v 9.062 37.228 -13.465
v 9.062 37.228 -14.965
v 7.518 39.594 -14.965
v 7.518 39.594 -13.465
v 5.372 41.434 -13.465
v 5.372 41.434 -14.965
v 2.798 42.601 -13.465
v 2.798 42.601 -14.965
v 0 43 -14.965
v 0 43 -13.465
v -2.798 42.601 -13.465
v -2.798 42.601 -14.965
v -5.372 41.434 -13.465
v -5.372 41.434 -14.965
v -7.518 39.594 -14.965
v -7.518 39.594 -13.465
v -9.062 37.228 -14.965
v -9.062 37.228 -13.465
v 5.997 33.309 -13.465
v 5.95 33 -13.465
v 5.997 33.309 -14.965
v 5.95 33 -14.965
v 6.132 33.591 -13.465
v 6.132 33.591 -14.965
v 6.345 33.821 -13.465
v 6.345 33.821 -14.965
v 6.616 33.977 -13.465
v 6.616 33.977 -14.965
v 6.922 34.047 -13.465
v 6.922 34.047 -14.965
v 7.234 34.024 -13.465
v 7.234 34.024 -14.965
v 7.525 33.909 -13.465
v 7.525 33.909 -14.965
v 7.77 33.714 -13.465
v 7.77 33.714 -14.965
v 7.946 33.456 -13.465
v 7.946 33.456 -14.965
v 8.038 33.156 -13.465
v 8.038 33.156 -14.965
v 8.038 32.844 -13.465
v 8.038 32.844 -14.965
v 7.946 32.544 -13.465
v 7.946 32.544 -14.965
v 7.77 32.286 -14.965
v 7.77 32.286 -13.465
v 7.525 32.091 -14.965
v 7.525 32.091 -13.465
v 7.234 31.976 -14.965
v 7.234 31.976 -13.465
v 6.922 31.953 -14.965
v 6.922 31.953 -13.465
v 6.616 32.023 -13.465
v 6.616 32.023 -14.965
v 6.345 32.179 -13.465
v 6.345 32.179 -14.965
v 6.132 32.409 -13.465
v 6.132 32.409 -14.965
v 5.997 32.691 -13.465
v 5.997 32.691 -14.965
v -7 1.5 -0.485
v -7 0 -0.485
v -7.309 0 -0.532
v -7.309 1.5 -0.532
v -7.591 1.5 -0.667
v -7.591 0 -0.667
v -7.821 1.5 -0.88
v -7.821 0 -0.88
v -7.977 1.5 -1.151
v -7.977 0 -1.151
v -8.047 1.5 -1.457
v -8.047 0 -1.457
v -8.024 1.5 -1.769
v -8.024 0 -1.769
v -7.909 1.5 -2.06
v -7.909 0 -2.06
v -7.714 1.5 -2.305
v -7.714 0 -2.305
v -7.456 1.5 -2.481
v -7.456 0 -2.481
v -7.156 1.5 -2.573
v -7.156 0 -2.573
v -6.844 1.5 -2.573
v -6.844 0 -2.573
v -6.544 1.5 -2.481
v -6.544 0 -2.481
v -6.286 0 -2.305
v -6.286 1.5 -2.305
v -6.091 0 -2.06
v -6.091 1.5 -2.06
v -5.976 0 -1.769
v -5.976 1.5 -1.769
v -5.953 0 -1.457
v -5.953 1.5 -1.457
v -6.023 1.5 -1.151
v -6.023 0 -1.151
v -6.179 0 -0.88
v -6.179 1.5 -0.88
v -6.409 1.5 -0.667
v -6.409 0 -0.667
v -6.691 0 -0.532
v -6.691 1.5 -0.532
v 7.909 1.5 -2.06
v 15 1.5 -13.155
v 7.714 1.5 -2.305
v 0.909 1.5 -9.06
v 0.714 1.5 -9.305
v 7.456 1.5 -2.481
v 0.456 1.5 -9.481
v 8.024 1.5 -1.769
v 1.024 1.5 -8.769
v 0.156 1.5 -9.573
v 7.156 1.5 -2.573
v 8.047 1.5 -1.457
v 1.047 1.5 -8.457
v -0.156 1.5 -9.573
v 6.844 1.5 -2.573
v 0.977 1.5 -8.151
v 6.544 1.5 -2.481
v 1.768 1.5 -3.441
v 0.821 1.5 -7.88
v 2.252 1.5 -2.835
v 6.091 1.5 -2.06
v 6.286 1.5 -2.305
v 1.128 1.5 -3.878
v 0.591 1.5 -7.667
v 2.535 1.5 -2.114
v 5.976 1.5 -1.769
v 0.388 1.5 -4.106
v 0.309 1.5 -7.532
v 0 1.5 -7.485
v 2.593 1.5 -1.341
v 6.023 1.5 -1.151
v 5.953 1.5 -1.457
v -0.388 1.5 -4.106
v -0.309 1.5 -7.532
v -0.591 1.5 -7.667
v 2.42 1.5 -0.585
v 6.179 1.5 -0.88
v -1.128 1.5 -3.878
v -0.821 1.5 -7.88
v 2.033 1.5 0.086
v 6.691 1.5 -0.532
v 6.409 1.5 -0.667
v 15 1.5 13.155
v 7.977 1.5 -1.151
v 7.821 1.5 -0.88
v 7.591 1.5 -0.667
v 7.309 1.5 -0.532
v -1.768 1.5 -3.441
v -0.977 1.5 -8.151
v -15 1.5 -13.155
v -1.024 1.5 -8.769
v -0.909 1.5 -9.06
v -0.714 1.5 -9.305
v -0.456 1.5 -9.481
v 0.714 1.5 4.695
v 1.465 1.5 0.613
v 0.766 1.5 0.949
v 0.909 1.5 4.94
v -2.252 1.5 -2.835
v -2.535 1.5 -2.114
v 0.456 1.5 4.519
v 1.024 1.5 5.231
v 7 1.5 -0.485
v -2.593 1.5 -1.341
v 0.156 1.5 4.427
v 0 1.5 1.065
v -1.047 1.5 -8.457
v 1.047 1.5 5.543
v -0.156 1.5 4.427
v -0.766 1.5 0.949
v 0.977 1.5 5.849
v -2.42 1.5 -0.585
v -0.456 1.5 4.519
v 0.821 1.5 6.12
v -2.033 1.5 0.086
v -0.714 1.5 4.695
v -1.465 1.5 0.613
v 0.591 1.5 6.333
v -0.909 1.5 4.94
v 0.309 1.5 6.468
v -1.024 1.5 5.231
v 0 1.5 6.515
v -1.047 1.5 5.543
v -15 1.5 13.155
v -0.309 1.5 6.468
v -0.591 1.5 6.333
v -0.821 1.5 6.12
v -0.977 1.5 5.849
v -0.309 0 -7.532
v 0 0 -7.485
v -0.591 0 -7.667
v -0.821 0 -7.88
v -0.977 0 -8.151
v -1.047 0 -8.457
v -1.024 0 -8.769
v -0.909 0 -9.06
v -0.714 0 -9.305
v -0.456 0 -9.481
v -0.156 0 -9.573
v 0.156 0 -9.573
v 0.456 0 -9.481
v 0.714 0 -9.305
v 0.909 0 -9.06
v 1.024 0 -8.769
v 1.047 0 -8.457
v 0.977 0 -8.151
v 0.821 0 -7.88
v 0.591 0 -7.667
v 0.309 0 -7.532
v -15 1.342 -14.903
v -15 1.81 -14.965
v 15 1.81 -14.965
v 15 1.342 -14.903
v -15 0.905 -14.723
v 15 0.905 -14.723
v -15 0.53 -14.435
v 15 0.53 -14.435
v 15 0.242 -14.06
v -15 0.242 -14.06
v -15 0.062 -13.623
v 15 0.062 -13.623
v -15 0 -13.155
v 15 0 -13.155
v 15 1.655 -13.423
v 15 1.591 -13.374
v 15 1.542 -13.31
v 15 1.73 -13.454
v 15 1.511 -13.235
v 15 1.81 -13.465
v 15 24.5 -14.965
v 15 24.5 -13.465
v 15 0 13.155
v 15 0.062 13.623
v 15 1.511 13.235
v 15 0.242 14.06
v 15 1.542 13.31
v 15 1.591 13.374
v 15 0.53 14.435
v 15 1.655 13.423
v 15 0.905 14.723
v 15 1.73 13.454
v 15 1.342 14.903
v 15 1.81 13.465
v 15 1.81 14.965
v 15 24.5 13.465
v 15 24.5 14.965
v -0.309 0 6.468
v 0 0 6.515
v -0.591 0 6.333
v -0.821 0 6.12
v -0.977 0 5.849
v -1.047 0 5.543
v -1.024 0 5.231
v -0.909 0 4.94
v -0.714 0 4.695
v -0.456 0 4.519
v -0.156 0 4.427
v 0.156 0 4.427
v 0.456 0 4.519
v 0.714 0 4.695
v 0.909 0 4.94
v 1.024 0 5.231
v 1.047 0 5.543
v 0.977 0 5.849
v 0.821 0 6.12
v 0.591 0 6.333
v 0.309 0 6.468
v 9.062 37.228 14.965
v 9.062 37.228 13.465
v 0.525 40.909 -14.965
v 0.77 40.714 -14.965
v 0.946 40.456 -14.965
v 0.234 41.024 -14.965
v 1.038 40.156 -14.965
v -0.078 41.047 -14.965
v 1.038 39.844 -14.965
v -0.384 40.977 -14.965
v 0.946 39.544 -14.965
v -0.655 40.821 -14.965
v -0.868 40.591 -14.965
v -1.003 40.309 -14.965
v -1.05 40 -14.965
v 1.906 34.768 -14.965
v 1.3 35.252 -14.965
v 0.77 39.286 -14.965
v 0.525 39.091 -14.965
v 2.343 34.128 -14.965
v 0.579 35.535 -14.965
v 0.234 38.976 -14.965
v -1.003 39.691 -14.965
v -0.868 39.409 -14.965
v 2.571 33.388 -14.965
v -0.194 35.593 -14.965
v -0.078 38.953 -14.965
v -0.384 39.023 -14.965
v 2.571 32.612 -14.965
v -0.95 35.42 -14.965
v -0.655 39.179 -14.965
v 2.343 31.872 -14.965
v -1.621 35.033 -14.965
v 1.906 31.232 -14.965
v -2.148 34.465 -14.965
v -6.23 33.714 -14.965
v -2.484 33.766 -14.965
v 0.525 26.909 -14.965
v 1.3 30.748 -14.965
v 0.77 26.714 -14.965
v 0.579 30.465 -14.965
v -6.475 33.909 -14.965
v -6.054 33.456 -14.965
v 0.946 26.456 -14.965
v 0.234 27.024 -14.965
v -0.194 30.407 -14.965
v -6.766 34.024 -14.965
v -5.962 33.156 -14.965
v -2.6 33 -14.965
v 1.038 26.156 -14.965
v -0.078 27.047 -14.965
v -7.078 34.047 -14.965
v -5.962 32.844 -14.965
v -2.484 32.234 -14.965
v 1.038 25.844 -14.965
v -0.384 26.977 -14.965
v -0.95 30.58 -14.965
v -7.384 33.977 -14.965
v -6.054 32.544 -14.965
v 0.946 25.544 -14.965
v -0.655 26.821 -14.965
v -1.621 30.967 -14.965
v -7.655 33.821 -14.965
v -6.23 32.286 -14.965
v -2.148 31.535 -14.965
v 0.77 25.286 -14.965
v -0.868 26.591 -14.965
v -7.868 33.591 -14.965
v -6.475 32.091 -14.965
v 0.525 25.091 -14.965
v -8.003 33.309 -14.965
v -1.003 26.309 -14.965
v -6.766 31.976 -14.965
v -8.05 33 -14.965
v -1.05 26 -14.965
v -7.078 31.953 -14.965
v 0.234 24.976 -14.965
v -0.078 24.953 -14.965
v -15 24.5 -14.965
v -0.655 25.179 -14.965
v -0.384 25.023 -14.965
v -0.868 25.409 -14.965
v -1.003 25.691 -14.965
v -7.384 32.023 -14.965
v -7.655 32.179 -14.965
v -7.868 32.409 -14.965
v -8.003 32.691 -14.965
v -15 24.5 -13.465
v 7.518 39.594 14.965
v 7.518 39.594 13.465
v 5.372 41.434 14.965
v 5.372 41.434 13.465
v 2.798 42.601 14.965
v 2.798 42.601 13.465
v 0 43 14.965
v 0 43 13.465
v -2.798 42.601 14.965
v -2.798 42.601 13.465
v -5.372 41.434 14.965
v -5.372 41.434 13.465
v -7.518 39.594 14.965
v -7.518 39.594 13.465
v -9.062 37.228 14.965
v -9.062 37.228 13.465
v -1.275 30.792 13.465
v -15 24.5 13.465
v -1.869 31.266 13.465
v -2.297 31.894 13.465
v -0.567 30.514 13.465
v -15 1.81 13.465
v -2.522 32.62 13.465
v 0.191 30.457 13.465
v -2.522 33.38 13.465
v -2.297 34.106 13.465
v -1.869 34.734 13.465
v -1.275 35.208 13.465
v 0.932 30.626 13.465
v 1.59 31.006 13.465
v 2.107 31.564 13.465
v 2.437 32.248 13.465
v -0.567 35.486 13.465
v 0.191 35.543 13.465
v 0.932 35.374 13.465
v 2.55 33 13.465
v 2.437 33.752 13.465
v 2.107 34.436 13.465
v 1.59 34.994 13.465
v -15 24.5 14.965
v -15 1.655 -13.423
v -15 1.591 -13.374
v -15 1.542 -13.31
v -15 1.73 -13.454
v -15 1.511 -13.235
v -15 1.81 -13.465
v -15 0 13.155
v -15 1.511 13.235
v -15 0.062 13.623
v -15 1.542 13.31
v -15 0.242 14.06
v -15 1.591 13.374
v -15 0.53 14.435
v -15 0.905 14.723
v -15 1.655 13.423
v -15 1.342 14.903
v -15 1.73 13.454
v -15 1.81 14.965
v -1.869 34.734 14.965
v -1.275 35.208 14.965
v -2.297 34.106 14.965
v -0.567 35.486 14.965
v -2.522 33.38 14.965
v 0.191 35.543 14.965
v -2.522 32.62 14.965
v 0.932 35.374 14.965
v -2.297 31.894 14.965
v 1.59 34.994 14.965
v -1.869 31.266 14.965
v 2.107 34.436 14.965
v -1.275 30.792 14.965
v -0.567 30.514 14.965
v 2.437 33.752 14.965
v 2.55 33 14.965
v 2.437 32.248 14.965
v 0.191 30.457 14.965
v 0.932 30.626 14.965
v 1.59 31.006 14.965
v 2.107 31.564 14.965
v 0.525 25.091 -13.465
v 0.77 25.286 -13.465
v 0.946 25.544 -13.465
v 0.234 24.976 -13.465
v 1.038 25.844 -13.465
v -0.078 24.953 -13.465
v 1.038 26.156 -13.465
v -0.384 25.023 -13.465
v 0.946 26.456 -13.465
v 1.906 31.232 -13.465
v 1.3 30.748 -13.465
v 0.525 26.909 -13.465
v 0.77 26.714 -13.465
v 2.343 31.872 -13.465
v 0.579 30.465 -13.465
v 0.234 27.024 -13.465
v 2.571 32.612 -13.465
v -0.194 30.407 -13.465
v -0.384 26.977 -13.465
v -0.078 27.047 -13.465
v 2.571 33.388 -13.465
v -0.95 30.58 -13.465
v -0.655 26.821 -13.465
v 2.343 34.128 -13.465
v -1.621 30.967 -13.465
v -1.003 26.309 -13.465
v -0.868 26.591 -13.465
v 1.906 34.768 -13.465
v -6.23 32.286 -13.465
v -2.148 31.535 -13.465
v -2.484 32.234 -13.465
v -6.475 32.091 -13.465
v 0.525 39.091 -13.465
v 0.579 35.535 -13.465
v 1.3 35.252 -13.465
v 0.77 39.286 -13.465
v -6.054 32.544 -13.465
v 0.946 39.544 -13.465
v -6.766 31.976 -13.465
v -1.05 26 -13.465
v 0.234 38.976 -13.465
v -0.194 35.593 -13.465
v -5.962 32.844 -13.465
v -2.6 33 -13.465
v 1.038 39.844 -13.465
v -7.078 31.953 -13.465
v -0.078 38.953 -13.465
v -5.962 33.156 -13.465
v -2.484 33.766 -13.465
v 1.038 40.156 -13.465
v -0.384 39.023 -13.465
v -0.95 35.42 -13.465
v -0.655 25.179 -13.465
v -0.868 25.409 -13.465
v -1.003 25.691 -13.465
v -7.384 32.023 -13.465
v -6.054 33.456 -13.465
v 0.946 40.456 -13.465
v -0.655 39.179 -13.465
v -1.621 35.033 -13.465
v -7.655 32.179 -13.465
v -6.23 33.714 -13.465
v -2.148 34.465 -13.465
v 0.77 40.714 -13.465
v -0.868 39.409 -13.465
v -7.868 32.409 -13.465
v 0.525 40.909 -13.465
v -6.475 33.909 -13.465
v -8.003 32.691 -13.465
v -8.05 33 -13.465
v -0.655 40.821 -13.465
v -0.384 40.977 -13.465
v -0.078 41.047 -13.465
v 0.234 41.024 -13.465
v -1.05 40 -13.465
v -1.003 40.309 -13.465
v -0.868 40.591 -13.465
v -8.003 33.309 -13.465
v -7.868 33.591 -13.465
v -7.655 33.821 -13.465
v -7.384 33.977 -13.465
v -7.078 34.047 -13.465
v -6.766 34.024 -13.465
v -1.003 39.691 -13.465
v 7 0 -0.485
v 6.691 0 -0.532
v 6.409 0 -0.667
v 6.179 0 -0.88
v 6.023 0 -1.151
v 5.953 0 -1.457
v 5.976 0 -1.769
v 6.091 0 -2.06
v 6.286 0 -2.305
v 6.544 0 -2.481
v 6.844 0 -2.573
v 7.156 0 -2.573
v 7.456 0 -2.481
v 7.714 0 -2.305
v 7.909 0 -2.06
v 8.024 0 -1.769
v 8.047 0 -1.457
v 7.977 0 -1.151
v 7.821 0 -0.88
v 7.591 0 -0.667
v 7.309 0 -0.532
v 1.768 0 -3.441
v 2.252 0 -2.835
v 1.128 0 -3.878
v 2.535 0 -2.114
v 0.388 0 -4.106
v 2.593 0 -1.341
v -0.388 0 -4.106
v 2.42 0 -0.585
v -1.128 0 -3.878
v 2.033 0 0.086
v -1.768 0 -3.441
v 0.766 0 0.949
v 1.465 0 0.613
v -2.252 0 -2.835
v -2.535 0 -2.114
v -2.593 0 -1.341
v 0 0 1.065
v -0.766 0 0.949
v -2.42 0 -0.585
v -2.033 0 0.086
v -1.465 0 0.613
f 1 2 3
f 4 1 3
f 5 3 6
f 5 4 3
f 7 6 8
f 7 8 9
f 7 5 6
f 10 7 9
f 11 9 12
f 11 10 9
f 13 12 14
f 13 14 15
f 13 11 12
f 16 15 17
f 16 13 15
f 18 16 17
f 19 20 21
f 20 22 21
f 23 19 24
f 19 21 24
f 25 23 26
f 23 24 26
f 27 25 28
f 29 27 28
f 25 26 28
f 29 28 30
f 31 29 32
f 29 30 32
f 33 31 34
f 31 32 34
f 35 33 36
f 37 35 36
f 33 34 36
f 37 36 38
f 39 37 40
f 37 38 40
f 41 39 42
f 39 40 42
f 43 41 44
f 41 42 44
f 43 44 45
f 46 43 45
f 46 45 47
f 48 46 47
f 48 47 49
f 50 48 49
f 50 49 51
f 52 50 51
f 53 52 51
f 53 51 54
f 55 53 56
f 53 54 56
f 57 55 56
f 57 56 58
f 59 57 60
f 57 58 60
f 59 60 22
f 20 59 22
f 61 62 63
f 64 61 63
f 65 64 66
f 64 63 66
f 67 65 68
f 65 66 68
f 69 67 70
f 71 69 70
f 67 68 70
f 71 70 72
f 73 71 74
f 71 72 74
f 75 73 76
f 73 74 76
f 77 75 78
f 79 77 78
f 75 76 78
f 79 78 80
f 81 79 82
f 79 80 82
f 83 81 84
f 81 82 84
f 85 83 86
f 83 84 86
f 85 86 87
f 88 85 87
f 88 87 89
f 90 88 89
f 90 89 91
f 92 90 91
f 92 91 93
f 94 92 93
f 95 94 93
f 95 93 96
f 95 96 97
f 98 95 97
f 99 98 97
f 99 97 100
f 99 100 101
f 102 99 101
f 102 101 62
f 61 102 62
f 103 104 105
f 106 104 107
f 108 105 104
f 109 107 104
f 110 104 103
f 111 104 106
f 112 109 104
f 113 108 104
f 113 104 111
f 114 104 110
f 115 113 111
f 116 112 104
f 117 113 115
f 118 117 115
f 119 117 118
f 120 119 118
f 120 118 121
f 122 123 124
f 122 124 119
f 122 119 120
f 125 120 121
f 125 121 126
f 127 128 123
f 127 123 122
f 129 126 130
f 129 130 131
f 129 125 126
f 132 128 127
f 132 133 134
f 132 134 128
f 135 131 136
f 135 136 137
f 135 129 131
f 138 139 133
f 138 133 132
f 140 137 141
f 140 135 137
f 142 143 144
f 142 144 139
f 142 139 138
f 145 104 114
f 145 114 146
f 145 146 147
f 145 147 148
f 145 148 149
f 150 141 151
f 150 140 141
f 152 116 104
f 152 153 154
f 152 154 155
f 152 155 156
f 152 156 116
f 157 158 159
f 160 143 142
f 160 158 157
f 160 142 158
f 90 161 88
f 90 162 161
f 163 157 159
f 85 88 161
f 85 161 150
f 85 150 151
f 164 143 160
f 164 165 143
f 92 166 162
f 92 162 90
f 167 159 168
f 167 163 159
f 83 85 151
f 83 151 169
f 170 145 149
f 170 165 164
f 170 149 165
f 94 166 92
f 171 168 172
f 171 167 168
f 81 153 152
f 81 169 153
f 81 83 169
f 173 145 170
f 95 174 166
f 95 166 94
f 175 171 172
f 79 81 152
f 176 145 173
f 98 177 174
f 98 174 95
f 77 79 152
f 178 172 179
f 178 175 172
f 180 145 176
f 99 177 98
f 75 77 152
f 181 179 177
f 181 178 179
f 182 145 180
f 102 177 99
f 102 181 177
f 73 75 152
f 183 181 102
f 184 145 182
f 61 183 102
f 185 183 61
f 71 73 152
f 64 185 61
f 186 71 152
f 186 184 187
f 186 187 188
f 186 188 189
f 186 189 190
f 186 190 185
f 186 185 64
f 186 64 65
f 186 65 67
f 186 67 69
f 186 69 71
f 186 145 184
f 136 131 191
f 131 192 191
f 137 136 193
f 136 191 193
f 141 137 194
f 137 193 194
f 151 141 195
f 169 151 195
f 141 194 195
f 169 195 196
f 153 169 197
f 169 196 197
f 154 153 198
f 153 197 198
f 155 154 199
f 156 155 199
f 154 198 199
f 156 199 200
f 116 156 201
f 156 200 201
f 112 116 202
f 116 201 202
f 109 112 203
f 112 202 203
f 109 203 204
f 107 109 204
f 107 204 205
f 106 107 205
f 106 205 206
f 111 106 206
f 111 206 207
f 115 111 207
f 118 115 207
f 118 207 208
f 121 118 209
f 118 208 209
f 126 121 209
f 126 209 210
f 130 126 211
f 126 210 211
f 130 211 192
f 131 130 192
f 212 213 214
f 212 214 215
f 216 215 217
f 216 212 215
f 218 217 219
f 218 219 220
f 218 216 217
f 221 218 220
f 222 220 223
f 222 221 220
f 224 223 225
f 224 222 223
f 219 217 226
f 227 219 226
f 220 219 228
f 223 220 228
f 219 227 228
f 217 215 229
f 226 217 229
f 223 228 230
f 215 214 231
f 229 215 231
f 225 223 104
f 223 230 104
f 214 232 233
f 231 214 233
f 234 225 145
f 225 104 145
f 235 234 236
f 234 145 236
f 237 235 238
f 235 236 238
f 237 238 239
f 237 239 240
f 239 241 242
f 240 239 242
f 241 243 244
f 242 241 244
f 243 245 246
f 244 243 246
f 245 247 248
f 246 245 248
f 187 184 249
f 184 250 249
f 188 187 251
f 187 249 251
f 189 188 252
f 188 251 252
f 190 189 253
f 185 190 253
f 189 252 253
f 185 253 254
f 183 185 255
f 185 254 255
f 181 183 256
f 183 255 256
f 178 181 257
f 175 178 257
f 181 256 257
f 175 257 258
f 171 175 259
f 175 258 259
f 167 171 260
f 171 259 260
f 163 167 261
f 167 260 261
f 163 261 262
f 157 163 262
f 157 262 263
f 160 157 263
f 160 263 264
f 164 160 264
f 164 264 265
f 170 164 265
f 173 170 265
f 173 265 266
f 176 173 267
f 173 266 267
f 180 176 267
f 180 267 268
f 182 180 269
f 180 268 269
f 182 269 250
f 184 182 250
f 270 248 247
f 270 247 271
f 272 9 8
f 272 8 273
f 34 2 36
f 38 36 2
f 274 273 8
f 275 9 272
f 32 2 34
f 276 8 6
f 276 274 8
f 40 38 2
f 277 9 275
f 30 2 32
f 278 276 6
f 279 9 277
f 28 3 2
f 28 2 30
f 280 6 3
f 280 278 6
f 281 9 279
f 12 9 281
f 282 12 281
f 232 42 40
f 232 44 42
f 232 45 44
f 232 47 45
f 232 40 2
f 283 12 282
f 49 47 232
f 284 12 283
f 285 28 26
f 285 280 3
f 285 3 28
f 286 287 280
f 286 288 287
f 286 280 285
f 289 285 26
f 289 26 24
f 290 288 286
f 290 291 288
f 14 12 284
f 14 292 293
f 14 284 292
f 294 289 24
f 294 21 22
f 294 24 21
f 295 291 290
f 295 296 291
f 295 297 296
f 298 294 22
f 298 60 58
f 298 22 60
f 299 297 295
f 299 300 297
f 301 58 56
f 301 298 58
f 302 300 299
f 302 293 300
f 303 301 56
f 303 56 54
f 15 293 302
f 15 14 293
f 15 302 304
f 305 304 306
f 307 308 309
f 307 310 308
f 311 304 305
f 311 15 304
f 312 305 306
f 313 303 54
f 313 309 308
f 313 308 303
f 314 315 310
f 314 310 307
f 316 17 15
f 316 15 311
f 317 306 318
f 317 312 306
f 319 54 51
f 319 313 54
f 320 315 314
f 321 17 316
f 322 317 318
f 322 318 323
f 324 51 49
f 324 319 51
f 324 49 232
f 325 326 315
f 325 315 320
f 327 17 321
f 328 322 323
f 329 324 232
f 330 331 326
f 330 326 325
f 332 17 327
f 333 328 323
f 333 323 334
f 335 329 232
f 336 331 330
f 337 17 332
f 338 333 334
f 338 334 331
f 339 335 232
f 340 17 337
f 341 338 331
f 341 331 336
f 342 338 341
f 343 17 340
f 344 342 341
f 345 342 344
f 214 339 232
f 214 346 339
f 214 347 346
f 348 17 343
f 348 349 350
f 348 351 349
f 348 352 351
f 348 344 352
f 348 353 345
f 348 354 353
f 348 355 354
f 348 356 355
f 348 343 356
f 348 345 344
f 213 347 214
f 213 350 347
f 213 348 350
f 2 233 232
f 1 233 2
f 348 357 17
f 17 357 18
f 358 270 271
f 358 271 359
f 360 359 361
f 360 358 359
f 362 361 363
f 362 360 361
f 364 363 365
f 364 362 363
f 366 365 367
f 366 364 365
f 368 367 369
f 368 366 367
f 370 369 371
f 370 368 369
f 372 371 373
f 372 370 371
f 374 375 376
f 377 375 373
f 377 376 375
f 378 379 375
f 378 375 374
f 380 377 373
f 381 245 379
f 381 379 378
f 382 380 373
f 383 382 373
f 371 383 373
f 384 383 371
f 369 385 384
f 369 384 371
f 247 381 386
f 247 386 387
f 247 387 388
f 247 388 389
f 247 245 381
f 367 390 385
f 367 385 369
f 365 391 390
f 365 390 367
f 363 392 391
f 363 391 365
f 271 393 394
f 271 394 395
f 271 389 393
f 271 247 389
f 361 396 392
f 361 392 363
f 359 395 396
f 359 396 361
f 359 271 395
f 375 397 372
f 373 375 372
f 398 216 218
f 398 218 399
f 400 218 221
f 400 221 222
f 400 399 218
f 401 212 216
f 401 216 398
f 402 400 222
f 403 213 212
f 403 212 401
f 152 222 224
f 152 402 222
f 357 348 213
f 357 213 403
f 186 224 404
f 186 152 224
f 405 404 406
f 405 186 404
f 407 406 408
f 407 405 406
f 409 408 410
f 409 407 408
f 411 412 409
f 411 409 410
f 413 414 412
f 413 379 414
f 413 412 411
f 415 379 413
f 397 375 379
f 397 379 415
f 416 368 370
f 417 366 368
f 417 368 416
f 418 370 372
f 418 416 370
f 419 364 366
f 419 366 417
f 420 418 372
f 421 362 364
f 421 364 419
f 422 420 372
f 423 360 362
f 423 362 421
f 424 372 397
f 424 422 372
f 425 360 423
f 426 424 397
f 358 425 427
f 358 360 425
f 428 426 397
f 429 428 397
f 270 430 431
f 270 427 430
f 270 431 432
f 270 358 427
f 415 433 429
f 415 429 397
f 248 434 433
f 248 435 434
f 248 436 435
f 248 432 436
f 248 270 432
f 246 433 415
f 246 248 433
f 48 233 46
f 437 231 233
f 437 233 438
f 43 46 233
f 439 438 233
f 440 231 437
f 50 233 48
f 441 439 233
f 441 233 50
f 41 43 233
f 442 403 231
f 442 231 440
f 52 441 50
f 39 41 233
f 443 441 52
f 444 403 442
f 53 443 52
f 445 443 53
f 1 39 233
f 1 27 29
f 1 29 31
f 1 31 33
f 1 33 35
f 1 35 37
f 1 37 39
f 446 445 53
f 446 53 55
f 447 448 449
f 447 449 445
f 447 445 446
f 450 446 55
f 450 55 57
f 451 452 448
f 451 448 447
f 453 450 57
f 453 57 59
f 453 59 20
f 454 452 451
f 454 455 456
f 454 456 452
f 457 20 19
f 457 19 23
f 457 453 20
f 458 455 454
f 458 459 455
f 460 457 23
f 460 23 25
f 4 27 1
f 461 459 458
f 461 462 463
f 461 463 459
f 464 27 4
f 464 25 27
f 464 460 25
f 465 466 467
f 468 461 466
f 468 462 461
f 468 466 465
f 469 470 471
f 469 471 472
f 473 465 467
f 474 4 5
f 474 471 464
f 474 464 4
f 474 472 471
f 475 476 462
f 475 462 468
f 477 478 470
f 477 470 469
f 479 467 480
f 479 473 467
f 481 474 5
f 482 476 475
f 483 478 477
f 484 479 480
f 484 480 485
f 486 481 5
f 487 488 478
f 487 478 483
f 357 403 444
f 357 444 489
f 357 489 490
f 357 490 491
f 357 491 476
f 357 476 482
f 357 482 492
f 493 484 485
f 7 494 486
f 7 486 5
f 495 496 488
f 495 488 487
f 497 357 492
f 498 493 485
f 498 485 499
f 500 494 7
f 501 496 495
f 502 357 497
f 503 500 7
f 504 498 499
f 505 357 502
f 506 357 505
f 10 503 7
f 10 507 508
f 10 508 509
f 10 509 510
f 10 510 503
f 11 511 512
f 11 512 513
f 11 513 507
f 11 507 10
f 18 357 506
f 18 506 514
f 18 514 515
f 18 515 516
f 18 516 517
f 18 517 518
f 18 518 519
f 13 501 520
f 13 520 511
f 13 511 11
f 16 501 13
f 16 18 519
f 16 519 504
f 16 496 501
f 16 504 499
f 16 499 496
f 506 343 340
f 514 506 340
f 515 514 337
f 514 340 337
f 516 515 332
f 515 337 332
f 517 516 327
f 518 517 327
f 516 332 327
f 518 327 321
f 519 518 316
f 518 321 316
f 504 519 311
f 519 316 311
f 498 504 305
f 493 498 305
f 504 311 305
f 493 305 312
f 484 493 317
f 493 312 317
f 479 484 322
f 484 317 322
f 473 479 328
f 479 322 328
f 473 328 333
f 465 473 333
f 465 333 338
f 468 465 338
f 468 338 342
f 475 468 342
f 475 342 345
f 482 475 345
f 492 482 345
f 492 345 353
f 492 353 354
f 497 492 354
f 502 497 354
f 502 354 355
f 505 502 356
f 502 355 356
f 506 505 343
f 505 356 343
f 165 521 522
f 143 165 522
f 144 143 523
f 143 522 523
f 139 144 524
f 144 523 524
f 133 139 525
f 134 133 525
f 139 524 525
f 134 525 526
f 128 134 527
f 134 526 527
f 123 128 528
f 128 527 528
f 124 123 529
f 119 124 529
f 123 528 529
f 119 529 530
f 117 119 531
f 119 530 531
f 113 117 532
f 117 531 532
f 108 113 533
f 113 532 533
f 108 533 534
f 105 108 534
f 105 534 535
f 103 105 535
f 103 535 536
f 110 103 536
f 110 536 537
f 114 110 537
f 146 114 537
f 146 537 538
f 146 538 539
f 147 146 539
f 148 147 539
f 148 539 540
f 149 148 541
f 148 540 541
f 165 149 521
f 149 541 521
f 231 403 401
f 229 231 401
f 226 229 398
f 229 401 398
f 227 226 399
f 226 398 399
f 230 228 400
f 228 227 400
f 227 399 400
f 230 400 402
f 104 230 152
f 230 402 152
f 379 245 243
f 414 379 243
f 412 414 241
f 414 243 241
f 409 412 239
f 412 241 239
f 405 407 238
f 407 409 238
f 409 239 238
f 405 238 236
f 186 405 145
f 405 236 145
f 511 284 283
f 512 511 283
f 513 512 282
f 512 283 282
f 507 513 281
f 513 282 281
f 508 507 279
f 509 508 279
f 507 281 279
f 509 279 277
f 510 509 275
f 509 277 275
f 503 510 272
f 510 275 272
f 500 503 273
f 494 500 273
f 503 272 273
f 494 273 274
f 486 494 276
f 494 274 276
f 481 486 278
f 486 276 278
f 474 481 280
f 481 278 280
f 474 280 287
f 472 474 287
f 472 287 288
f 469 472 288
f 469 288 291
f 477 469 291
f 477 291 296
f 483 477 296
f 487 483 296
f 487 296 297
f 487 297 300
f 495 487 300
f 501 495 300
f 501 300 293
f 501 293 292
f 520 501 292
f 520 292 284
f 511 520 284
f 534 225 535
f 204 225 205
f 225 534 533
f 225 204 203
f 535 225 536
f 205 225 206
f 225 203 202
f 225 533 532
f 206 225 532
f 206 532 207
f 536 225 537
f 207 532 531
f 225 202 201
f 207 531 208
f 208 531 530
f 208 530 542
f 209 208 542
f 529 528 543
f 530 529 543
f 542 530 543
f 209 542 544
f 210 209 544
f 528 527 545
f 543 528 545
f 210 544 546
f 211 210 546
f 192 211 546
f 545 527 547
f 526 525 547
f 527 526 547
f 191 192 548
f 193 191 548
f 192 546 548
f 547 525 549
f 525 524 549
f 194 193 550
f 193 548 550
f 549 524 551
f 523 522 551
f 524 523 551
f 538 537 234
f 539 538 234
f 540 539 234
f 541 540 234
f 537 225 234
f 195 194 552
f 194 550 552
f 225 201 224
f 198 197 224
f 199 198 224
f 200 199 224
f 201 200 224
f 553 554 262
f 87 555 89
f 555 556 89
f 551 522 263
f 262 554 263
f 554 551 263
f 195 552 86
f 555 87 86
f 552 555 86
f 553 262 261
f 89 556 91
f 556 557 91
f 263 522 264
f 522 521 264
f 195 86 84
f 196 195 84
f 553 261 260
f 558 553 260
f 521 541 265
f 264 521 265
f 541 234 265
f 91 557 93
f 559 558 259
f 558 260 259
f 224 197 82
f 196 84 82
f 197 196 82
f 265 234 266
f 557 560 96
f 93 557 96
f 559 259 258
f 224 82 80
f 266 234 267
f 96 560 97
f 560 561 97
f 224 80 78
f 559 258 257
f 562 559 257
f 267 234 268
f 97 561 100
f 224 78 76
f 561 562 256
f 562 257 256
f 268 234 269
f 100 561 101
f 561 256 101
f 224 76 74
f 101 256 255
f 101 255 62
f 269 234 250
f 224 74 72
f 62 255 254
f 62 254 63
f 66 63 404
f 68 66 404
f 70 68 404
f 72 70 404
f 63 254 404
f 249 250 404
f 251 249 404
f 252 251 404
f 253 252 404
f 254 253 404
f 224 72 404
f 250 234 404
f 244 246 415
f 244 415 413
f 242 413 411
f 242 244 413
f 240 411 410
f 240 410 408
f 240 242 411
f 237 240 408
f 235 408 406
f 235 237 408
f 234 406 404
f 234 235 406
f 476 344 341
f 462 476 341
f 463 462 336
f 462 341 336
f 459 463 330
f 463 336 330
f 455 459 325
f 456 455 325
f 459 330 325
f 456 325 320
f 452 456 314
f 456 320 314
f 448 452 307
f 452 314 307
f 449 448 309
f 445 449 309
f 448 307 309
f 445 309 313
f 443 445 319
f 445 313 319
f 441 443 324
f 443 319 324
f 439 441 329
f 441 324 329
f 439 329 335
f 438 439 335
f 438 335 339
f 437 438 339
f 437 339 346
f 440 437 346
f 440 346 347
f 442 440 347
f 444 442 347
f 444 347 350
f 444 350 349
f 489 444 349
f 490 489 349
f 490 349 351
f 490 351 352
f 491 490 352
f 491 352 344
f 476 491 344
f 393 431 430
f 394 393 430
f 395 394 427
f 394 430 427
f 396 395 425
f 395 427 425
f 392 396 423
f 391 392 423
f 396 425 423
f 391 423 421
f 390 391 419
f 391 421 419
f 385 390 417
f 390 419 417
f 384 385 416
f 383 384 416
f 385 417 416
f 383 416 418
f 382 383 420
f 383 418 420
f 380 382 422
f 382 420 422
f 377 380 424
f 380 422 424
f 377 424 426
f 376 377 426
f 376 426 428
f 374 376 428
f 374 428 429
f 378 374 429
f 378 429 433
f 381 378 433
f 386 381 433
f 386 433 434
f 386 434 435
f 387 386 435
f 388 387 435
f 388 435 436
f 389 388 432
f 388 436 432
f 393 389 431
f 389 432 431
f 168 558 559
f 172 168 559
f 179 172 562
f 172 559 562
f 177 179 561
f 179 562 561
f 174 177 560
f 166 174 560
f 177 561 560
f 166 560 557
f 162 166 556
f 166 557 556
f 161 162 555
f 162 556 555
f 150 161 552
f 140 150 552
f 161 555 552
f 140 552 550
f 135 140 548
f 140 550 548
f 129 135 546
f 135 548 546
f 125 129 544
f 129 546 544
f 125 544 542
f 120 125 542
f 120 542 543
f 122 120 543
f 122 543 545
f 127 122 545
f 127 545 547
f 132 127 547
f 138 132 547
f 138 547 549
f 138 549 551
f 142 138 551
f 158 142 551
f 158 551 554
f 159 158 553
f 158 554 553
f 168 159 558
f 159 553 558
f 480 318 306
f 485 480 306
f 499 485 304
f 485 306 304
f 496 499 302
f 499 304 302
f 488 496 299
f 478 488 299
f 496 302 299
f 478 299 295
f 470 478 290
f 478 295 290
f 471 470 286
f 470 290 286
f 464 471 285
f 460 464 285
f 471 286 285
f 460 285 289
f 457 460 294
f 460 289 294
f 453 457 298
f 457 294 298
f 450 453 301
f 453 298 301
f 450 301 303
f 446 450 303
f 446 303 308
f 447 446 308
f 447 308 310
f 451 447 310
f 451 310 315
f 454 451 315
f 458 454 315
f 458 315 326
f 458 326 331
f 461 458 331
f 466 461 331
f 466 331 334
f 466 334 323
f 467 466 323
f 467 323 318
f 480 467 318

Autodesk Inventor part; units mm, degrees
ref_plane "YZ Plane" through (0, 0, 0) normal (1, 0, 0) x (0, 1, 0)
ref_plane "XZ Plane" through (0, 0, 0) normal (0, 1, 0) x (-1, 0, 0)
ref_plane "XY Plane" through (0, 0, 0) normal (0, 0, 1) x (1, 0, 0)
sketch "Sketch1" plane through (0, 0, 0) normal (0, 1, 0) x (-1, 0, 0)
  line L0 (15, 14.965) -> (-15, 14.965)
  line L1 (-15, 14.965) -> (-15, -14.965)
  line L2 (-15, -14.965) -> (15, -14.965)
  line L3 (15, -14.965) -> (15, 14.965)
  point P0 (0, 0)
  dimension "d0" = 29.93
  dimension "d1" = 30
  dimension "d2" = 15
  dimension "d3" = 14.965
extrude "Plate1" add sketch "Sketch1" along normal blind 1.5
sketch "Sketch2" plane through (-15, 0, -13.465) normal (0, 0, -1) x (-1, 0, 0)
  line L0 (-30, 0) -> (0, 0)
  line L1 (0, 0) -> (0, 43)
  line L2 (0, 43) -> (-30, 43)
  line L3 (-30, 43) -> (-30, 0)
edge flange "Flange1" height 43 angle 90 thickness 1.5 bend radius 0.31 thickness toward (0, 0, -1) relief tear relief width 1.5 relief depth 0.75 corner gap 0.31 corner form 0 edges at (0, 1.5, -14.965) (0, 1.5, 14.965) wall of the first edge with corners at (15, 0, -13.465) (-15, 0, -13.465) (-15, 43, -13.465) (15, 43, -13.465)
bend "Bend1"
corner "Corner1"
sketch "Sketch3" plane through (-15, 43, 14.965) normal (0, 0, 1) x (1, 0, 0)
  line L0 (0, 0) -> (30, 0) projected
  line L1 (0, -41.19) -> (0, 0) projected
  circle A0 centre (15, -10) radius 10
  line L2 (0, -18.5) -> (30, -18.5)
  line L3 (30, -18.5) -> (30, -28.5)
  line L4 (30, -28.5) -> (0, -28.5)
  line L5 (0, -28.5) -> (0, -18.5)
  line L6 (30, -18.5) -> (24.0624, -5.7723)
  line L7 (0, -18.5) -> (5.9376, -5.7723)
  line L8 (0, 0) -> (30, 0)
  line L9 (30, 0) -> (30, -25)
  line L10 (30, -25) -> (0, -25)
  line L11 (0, -25) -> (0, 0)
  point P0 (15, -43)
  point P1 (15, 0)
  dimension "d15" = 10
  dimension "d16" = 0
  dimension "d17" = 20
  dimension "d18" = 8.5
  dimension "d19" = 0
  dimension "d20" = 30
  dimension "d21" = 10
  dimension "d22" = 25
extrude "Extrusion1" cut sketch "Sketch3" against normal blind 35 contours L0 A0 L7 L1 | L0 L9 L6 A0
sketch "Sketch4" plane through (15, 1.81, -14.965) normal (0, 0, -1) x (-1, 0, 0)
  arc A0 (24.0624, 35.4177) -> (5.9376, 35.4177) centre (15, 31.19) ccw projected
  circle A1 centre (15, 31.19) radius 2.6
  circle A2 centre (8, 31.19) radius 1.05
  circle A3 centre (22, 31.19) radius 1.05
  circle A4 centre (15, 38.19) radius 1.05
  circle A5 centre (15, 24.19) radius 1.05
  point P0 (15, -1.81)
  dimension "d25" = 5.2
  dimension "d26" = 0
  dimension "d27" = 7
  dimension "d28" = 2.1
  dimension "d29" = 7
  dimension "d30" = 0
  dimension "d31" = 2.1
  dimension "d32" = 0
  dimension "d33" = 7
  dimension "d34" = 2.1
  dimension "d35" = 7
  dimension "d36" = 0
  dimension "d37" = 2.1
extrude "Extrusion2" cut sketch "Sketch4" against normal blind 1.5
sketch "Sketch5" plane through (-15, 1.81, 14.965) normal (0, 0, 1) x (1, 0, 0)
  arc A0 (24.0624, 35.4177) -> (5.9376, 35.4177) centre (15, 31.19) ccw projected
  circle A1 centre (15, 31.19) radius 2.55
  point P0 (15, -1.81)
  dimension "d40" = 5.1
extrude "Extrusion3" cut sketch "Sketch5" against normal blind 1.5
sketch "Sketch6" plane through (0, 1.5, 0) normal (0, 1, 0) x (1, 0, 0)
  circle A0 centre (-7, 1.535) radius 0.7835 projected
  circle A1 centre (0, 8.535) radius 0.7835 projected
  circle A2 centre (7, 1.535) radius 0.7835 projected
  circle A3 centre (0, -5.465) radius 0.7835 projected
  circle A4 centre (0, 1.535) radius 1.75 projected
  circle A5 centre (0, 1.535) radius 9.96 projected
  point P0 (0, 0)
hole "Hole1" at (-7, 1.5, -1.535) at (0, 1.5, 5.465) at (7, 1.5, -1.535) at (0, 1.5, -8.535) direction (0, -1, 0) diameter 2.1 depth 1.5
sketch "Sketch7" plane through (0, 1.5, 0) normal (0, 1, 0) x (1, 0, 0)
  circle A0 centre (0, 1.535) radius 1.75 projected
  point P0 (0, 0)
hole "Hole2" at (0, 1.5, -1.535) direction (0, -1, 0) diameter 5.2 depth 1.5 clearance for "Hex Head Bolt" size "M5" standard "Ansi Metric M Profile"
equation "\"d48\" = Thickness"
equation "\"d55\" = Thickness"
equation "\"d4\" = Thickness"
equation "\"d5\" = BendReliefWidth"
equation "\"d6\" = BendReliefDepth"
equation "\"d7\" = MinimumRemnant"
equation "\"d8\" = TransitionRadius"
equation "\"d11\" = BendRadius"
equation "\"d12\" = CornerReliefSize"
equation "\"d13\" = GapSize"
equation "\"d14\" = JacobiRadiusSize"
equation "\"BendReliefWidth\" = Thickness"
equation "\"BendReliefDepth\" = 0.5 * Thickness"
equation "\"CornerReliefSize\" = 4 * Thickness"
equation "\"MinimumRemnant\" = 2 * Thickness"
equation "\"TransitionRadius\" = BendRadius"
equation "\"JacobiRadiusSize\" = BendRadius"
equation "\"GapSize\" = Thickness"
equation "\"Thickness\" = 1.5"
equation "\"BendRadius\" = 0.31"
properties part number "partpart" material "Aluminum 6061-AHC"
